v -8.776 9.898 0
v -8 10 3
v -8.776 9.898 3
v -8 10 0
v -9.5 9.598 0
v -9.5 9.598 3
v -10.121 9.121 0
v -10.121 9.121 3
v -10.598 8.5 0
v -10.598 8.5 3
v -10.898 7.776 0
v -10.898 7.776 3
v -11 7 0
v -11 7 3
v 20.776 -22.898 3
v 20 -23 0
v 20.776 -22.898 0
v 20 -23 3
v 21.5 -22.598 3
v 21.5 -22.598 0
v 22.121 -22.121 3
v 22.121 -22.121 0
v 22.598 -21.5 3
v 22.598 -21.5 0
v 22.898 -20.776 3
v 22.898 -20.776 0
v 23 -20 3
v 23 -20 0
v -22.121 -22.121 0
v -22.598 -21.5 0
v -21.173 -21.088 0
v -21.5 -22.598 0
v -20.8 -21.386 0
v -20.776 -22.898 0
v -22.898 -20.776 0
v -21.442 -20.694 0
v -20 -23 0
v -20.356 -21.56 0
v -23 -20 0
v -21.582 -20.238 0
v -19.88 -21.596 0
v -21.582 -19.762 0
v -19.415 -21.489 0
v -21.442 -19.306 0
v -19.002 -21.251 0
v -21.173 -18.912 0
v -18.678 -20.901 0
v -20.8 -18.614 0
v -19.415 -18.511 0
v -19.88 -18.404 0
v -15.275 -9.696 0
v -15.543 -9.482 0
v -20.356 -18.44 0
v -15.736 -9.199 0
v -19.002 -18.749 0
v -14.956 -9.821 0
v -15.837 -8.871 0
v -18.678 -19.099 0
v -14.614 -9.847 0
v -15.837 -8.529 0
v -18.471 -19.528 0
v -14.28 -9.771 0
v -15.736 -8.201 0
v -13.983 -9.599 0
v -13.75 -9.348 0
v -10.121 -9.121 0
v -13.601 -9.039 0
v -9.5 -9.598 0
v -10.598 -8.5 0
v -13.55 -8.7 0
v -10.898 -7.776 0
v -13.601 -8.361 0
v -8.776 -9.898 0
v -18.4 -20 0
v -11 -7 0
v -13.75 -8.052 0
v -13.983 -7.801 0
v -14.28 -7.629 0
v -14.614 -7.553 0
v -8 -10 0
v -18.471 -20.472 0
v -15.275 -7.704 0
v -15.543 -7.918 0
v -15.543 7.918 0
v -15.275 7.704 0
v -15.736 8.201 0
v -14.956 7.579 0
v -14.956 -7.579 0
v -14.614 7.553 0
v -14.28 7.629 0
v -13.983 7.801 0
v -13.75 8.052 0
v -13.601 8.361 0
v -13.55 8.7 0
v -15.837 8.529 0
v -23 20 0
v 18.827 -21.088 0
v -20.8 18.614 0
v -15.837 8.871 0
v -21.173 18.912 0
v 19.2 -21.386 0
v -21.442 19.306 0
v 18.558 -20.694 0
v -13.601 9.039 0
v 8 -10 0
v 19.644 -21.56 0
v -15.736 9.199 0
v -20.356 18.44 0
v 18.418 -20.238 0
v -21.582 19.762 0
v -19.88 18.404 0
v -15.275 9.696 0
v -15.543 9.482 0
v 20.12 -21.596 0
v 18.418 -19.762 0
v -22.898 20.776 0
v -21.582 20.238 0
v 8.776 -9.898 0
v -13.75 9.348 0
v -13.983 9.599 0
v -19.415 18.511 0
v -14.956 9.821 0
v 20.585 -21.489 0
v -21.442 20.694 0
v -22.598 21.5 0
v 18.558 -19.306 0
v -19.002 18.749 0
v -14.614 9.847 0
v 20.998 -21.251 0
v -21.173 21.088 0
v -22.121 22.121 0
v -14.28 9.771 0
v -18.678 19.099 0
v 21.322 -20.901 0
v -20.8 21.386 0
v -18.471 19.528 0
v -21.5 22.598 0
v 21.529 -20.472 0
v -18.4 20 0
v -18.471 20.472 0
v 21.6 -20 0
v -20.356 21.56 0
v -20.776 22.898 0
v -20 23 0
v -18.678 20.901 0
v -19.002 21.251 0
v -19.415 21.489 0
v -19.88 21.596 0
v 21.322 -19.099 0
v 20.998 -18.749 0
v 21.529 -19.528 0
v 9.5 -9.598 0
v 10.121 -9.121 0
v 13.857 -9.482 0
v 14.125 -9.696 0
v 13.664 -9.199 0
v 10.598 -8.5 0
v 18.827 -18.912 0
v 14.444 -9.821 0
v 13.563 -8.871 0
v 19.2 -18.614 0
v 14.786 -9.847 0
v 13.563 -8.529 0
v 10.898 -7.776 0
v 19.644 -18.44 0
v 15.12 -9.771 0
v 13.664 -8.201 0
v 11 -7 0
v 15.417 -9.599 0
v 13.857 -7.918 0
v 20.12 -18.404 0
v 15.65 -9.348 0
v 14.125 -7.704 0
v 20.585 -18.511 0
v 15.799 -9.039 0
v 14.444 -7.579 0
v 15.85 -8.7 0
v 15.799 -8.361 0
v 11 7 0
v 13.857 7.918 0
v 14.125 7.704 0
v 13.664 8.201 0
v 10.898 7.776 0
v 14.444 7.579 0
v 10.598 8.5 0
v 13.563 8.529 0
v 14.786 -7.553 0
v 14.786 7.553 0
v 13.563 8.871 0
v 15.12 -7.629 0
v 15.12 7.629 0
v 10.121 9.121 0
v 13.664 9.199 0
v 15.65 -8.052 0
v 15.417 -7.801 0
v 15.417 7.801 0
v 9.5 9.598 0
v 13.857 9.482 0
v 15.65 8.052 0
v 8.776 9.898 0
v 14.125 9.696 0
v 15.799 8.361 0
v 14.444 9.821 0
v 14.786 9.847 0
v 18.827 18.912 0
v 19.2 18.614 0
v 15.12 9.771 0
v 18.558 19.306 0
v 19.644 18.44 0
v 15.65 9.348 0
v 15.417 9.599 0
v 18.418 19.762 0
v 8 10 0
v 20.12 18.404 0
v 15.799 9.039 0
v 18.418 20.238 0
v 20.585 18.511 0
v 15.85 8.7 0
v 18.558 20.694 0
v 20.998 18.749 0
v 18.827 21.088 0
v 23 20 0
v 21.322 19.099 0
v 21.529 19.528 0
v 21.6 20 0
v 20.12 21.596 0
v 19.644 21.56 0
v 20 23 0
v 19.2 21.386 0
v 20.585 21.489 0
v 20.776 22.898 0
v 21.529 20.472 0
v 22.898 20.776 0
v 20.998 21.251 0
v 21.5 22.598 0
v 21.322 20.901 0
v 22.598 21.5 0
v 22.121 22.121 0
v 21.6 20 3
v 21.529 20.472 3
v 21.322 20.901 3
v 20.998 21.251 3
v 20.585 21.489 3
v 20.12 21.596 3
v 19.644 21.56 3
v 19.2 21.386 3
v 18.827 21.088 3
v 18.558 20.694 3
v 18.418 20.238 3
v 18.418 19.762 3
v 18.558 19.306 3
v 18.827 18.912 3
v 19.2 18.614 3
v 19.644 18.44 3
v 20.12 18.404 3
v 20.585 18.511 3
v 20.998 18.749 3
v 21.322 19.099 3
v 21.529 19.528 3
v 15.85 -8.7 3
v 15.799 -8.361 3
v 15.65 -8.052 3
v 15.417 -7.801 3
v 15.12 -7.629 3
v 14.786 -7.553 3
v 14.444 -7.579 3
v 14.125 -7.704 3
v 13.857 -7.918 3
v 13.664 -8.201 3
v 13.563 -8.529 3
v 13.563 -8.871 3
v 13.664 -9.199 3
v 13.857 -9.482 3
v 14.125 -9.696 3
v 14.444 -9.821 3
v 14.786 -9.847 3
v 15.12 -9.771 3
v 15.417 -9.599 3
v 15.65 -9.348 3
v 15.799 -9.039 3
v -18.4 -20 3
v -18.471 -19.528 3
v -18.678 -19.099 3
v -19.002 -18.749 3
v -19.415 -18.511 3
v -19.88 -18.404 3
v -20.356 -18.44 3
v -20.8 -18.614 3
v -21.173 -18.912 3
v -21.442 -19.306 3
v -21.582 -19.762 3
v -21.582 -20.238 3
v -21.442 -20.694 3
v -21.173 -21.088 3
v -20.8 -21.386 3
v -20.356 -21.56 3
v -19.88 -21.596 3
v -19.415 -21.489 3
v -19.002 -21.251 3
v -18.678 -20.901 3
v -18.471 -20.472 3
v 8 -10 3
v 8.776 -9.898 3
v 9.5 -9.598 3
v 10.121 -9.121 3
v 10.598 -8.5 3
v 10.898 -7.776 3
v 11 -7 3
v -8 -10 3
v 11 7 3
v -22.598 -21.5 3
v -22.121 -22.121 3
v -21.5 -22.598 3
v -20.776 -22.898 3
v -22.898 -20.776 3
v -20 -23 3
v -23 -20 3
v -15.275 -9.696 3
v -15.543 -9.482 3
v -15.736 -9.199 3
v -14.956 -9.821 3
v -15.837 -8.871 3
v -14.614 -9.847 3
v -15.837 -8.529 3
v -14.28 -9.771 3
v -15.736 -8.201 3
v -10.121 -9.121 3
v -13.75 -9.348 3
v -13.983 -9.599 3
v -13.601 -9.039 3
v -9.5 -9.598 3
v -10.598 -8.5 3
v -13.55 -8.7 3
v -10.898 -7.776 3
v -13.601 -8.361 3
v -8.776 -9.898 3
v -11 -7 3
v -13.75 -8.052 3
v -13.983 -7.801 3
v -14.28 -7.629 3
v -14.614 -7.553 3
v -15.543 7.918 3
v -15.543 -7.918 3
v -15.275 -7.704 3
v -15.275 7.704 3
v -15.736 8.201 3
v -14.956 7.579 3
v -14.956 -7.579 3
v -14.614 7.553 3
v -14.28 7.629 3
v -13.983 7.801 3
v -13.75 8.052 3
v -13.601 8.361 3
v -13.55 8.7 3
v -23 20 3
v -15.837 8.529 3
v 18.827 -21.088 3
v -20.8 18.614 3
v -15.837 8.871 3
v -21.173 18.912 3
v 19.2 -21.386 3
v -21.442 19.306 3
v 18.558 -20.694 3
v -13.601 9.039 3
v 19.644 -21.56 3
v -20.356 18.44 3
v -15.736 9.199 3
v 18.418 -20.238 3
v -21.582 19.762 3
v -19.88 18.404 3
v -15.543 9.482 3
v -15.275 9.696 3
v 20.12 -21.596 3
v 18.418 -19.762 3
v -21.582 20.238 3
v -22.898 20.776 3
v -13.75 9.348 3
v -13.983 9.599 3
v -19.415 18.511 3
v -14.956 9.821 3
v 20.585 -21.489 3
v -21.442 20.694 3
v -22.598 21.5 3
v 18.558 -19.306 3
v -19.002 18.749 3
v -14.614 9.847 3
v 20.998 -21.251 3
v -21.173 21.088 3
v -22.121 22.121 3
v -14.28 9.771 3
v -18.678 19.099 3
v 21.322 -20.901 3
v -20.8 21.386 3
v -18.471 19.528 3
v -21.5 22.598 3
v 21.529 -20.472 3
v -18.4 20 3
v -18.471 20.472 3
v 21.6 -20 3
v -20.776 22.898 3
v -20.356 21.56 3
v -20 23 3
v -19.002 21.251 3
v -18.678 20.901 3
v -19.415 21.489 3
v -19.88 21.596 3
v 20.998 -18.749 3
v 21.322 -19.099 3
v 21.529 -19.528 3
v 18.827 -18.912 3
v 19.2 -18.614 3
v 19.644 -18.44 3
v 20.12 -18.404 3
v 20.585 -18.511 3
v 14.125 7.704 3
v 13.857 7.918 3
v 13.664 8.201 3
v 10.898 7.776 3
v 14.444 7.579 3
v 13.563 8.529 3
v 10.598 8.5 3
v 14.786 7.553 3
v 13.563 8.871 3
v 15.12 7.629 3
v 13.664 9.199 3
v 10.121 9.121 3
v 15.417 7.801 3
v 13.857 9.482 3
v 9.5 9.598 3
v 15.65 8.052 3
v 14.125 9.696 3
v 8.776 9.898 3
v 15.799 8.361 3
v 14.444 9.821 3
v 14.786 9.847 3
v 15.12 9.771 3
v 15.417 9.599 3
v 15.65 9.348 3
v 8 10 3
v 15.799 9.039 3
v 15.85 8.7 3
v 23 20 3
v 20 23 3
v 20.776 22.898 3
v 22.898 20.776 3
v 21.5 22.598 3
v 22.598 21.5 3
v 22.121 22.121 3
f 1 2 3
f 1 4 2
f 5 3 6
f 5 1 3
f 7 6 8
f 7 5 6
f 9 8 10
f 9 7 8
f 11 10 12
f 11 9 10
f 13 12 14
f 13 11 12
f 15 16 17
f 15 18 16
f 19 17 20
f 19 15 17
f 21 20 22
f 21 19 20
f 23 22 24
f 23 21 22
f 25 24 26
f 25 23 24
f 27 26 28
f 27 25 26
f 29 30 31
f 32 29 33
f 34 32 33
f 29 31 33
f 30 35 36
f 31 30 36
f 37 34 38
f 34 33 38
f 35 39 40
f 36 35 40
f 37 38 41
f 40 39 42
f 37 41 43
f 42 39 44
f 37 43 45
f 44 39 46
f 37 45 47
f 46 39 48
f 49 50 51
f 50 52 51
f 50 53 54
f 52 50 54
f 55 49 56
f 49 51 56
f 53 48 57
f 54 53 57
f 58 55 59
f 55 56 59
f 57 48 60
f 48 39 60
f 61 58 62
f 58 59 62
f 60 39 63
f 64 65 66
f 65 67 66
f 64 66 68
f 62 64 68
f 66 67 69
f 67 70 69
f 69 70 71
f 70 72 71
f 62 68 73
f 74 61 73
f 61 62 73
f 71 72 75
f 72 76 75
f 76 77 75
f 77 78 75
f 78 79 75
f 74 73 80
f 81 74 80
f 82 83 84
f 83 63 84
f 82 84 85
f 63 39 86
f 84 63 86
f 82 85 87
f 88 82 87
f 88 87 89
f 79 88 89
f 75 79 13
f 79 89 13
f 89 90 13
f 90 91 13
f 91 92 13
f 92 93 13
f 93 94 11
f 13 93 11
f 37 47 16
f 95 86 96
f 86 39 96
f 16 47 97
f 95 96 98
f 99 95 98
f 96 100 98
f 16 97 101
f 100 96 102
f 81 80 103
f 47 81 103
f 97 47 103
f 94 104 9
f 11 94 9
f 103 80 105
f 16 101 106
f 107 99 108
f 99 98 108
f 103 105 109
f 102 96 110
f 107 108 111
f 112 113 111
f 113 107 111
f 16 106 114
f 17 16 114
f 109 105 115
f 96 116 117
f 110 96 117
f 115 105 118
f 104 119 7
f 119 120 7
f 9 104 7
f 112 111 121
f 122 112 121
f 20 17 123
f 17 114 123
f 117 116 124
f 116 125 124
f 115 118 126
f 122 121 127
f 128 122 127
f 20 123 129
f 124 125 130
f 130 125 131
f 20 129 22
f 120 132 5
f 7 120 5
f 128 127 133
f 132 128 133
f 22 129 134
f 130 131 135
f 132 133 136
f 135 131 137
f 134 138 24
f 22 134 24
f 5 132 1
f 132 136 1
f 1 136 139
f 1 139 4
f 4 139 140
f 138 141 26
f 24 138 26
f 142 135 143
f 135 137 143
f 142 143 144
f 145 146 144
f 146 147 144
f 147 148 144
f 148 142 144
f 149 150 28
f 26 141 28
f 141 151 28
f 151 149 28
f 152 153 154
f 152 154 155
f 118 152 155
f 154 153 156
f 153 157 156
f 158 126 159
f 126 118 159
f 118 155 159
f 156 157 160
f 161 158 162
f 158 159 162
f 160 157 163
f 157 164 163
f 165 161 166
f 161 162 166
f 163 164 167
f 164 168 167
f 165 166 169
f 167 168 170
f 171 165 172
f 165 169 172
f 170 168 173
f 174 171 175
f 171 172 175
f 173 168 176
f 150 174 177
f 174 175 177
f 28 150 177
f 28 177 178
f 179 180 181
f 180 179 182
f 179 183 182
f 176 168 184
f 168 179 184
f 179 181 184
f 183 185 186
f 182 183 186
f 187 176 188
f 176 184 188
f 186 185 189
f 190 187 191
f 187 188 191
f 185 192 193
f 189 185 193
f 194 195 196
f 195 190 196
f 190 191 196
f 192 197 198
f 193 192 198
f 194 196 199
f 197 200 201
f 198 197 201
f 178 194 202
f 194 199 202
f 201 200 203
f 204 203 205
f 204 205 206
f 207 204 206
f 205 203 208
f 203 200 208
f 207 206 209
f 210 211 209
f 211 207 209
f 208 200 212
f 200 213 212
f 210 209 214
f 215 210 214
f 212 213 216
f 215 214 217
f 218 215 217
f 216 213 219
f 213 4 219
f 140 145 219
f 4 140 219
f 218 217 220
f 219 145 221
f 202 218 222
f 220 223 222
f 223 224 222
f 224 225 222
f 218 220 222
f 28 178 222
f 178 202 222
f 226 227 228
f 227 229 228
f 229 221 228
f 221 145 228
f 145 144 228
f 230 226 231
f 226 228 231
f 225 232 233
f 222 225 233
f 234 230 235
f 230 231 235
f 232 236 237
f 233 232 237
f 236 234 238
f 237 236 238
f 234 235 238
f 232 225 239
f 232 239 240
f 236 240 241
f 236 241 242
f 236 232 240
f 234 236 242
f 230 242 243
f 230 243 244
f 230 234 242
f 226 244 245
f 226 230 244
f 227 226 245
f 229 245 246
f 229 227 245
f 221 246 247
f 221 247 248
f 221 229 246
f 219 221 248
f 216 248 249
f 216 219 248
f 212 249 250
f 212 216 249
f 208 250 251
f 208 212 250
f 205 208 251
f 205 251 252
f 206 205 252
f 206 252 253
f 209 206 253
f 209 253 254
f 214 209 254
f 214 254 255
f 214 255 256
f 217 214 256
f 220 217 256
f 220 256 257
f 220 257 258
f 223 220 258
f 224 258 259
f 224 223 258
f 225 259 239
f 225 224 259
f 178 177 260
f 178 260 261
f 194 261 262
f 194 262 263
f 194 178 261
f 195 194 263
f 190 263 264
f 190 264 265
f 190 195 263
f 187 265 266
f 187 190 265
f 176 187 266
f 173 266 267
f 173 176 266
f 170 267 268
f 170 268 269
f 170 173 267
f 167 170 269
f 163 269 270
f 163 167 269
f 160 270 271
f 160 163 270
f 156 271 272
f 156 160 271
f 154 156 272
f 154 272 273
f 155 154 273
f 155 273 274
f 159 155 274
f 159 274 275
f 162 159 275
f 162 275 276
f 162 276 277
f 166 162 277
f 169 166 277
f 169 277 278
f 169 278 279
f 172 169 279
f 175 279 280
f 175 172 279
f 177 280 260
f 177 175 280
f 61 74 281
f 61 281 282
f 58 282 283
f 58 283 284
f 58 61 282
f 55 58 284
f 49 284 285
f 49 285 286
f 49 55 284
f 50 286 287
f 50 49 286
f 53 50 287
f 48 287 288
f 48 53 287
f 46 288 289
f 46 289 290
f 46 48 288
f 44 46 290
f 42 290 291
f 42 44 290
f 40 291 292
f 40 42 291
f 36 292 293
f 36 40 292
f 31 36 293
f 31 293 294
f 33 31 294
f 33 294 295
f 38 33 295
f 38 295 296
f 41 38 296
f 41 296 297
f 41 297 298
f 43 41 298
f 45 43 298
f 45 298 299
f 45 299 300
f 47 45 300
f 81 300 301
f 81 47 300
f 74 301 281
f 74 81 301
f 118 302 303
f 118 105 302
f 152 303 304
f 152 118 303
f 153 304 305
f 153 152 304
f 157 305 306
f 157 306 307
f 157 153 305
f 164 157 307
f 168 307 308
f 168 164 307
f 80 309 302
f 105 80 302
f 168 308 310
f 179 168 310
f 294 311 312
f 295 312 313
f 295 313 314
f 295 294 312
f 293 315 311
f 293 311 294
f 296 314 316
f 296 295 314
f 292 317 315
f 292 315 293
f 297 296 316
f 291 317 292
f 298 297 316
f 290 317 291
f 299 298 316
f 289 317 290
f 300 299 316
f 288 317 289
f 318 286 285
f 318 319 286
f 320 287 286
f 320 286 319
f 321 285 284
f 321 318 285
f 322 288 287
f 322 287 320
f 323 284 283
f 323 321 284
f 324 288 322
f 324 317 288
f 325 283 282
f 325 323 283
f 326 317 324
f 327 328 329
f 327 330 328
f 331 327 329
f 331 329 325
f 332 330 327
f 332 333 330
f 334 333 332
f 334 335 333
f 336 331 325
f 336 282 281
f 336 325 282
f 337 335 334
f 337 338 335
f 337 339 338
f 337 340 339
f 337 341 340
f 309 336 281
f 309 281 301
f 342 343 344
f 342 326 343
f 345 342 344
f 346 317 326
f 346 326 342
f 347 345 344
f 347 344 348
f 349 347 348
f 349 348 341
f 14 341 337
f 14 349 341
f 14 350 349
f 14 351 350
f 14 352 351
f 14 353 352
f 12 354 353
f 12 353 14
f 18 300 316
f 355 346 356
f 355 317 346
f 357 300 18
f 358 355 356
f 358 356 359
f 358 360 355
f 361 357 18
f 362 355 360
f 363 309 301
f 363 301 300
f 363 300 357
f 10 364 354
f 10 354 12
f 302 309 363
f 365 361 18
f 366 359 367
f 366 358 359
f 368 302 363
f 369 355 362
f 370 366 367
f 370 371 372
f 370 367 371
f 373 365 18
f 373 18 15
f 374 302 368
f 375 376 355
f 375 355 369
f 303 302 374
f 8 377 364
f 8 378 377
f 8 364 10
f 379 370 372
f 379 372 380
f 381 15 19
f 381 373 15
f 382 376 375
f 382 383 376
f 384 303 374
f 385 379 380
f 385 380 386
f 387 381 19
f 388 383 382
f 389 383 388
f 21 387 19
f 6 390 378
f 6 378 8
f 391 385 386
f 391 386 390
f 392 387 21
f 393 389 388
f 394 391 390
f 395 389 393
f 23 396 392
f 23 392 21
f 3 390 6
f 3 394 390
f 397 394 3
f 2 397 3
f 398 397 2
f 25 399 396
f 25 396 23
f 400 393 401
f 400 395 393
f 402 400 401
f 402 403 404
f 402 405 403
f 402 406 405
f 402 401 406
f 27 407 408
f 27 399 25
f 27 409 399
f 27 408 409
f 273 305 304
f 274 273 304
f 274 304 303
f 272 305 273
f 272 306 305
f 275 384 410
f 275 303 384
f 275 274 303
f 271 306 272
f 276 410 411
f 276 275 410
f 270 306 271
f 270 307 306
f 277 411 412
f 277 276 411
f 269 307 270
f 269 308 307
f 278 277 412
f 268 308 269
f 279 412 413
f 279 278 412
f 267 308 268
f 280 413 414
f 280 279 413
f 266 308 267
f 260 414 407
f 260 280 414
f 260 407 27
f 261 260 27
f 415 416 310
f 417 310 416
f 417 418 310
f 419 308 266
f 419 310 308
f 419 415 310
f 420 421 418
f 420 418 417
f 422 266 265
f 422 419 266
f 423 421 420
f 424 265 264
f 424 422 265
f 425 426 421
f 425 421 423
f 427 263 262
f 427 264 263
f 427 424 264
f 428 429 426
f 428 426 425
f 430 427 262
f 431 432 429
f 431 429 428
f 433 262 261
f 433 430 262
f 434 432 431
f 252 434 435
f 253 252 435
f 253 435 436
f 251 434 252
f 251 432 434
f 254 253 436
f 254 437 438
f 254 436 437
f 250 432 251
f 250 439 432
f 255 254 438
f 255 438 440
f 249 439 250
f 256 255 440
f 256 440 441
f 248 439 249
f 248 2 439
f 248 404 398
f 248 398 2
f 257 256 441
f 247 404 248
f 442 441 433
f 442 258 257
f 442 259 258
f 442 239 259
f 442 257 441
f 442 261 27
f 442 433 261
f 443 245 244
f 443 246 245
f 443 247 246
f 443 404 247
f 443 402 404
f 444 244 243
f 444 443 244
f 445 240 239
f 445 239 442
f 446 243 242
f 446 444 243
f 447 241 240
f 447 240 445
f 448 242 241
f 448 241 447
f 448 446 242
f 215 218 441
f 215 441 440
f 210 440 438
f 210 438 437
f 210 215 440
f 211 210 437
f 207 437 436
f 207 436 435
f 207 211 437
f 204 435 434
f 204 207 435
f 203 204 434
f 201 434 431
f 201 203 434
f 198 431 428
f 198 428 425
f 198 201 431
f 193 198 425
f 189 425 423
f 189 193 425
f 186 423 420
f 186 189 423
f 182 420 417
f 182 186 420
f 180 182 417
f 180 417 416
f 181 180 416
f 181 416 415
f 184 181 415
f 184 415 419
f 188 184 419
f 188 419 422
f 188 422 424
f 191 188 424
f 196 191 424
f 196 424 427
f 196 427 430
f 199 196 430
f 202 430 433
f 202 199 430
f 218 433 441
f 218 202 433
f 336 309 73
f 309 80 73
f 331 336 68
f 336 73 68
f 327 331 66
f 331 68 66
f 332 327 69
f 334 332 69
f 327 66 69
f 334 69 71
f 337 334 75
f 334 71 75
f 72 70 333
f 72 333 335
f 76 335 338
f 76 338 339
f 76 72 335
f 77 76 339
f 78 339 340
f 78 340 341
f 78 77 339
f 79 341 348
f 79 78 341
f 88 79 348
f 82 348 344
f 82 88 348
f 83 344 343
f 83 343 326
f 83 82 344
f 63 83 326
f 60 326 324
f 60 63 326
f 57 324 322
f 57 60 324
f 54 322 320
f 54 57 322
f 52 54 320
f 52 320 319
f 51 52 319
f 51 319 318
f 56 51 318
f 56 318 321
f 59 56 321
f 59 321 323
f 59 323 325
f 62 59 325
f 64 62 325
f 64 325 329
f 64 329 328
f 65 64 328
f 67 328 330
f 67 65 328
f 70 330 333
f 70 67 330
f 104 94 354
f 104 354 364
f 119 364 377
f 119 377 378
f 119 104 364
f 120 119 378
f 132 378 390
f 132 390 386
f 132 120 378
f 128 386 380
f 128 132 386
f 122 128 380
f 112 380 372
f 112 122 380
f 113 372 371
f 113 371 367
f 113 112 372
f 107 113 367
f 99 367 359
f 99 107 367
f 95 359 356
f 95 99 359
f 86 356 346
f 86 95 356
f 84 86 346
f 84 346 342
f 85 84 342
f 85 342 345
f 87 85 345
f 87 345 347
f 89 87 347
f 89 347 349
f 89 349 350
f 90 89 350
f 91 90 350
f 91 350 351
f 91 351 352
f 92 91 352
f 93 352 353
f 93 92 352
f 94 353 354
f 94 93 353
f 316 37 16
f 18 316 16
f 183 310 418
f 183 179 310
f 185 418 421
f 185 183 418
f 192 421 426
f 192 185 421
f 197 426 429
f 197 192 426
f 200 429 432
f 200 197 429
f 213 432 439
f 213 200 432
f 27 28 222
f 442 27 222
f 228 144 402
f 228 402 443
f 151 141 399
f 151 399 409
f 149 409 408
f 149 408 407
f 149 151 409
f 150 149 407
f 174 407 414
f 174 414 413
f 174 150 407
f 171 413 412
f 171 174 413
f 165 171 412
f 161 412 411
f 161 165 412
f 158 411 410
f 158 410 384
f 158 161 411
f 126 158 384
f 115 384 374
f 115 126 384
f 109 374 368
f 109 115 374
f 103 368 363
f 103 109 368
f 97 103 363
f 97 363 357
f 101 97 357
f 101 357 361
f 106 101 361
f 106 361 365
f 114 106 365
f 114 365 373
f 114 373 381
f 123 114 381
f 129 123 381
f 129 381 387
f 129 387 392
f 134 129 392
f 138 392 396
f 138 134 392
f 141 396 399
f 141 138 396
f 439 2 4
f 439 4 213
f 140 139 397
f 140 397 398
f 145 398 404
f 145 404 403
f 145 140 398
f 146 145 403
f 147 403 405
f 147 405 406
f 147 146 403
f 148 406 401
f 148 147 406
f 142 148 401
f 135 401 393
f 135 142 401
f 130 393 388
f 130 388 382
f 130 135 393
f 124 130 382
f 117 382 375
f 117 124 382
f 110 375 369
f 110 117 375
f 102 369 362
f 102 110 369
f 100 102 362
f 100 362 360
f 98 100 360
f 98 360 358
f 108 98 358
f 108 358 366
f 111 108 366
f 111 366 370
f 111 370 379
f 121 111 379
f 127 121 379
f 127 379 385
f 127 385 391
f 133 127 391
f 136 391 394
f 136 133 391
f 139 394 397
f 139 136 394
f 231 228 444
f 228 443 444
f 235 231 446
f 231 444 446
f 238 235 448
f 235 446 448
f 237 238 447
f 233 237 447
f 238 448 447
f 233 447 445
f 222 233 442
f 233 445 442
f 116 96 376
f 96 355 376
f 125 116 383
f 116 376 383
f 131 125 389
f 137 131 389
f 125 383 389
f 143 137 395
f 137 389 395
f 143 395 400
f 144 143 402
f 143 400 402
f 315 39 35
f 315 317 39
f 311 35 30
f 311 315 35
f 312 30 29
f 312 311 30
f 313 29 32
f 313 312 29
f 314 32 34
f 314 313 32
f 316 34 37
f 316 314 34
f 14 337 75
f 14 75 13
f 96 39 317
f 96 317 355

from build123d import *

# Parameters (mm, degrees)
SKETCH_1_W          = 46
SKETCH_1_H          = 46
SKETCH_1_R          = 1.6
SKETCH_1_R_2        = 1.15
EXTRUDE_1_DEPTH     = 3
FILLET_1_R          = 3
SKETCH_2_W          = 22
SKETCH_2_H          = 20
CUT_EXTRUDE_1_DEPTH = 3
FILLET_2_R          = 3


with BuildPart() as part:
    # 草图1 → 凸台-拉伸1 (new body)
    with BuildSketch(Plane.XY):
        Rectangle(SKETCH_1_W, SKETCH_1_H)
        with Locations((-20, 20)):
            Circle(SKETCH_1_R, mode=Mode.SUBTRACT)
        with Locations((20, 20)):
            Circle(SKETCH_1_R, mode=Mode.SUBTRACT)
        with Locations((20, -20)):
            Circle(SKETCH_1_R, mode=Mode.SUBTRACT)
        with Locations((-20, -20)):
            Circle(SKETCH_1_R, mode=Mode.SUBTRACT)
        with Locations((-14.7, 8.7)):
            Circle(SKETCH_1_R_2, mode=Mode.SUBTRACT)
        with Locations((14.7, 8.7)):
            Circle(SKETCH_1_R_2, mode=Mode.SUBTRACT)
        with Locations((14.7, -8.7)):
            Circle(SKETCH_1_R_2, mode=Mode.SUBTRACT)
        with Locations((-14.7, -8.7)):
            Circle(SKETCH_1_R_2, mode=Mode.SUBTRACT)
    extrude(amount=EXTRUDE_1_DEPTH)

    # 圆角1
    fillet_1_edges = [part.edges().sort_by_distance(p)[0] for p in [
        (-23, 23, 1.5),
        (23, 23, 1.5),
        (23, -23, 1.5),
        (-23, -23, 1.5),
    ]]
    fillet(fillet_1_edges, radius=FILLET_1_R)

    # 草图2 → 切除-拉伸1 (cut)
    with BuildSketch(Plane.XY.offset(3)):
        Rectangle(SKETCH_2_W, SKETCH_2_H)
    extrude(amount=-CUT_EXTRUDE_1_DEPTH, mode=Mode.SUBTRACT)

    # 圆角2
    fillet_2_edges = [part.edges().sort_by_distance(p)[0] for p in [
        (-11, -10, 1.5),
        (-11, 10, 1.5),
        (11, 10, 1.5),
        (11, -10, 1.5),
    ]]
    fillet(fillet_2_edges, radius=FILLET_2_R)


solid = part.part
